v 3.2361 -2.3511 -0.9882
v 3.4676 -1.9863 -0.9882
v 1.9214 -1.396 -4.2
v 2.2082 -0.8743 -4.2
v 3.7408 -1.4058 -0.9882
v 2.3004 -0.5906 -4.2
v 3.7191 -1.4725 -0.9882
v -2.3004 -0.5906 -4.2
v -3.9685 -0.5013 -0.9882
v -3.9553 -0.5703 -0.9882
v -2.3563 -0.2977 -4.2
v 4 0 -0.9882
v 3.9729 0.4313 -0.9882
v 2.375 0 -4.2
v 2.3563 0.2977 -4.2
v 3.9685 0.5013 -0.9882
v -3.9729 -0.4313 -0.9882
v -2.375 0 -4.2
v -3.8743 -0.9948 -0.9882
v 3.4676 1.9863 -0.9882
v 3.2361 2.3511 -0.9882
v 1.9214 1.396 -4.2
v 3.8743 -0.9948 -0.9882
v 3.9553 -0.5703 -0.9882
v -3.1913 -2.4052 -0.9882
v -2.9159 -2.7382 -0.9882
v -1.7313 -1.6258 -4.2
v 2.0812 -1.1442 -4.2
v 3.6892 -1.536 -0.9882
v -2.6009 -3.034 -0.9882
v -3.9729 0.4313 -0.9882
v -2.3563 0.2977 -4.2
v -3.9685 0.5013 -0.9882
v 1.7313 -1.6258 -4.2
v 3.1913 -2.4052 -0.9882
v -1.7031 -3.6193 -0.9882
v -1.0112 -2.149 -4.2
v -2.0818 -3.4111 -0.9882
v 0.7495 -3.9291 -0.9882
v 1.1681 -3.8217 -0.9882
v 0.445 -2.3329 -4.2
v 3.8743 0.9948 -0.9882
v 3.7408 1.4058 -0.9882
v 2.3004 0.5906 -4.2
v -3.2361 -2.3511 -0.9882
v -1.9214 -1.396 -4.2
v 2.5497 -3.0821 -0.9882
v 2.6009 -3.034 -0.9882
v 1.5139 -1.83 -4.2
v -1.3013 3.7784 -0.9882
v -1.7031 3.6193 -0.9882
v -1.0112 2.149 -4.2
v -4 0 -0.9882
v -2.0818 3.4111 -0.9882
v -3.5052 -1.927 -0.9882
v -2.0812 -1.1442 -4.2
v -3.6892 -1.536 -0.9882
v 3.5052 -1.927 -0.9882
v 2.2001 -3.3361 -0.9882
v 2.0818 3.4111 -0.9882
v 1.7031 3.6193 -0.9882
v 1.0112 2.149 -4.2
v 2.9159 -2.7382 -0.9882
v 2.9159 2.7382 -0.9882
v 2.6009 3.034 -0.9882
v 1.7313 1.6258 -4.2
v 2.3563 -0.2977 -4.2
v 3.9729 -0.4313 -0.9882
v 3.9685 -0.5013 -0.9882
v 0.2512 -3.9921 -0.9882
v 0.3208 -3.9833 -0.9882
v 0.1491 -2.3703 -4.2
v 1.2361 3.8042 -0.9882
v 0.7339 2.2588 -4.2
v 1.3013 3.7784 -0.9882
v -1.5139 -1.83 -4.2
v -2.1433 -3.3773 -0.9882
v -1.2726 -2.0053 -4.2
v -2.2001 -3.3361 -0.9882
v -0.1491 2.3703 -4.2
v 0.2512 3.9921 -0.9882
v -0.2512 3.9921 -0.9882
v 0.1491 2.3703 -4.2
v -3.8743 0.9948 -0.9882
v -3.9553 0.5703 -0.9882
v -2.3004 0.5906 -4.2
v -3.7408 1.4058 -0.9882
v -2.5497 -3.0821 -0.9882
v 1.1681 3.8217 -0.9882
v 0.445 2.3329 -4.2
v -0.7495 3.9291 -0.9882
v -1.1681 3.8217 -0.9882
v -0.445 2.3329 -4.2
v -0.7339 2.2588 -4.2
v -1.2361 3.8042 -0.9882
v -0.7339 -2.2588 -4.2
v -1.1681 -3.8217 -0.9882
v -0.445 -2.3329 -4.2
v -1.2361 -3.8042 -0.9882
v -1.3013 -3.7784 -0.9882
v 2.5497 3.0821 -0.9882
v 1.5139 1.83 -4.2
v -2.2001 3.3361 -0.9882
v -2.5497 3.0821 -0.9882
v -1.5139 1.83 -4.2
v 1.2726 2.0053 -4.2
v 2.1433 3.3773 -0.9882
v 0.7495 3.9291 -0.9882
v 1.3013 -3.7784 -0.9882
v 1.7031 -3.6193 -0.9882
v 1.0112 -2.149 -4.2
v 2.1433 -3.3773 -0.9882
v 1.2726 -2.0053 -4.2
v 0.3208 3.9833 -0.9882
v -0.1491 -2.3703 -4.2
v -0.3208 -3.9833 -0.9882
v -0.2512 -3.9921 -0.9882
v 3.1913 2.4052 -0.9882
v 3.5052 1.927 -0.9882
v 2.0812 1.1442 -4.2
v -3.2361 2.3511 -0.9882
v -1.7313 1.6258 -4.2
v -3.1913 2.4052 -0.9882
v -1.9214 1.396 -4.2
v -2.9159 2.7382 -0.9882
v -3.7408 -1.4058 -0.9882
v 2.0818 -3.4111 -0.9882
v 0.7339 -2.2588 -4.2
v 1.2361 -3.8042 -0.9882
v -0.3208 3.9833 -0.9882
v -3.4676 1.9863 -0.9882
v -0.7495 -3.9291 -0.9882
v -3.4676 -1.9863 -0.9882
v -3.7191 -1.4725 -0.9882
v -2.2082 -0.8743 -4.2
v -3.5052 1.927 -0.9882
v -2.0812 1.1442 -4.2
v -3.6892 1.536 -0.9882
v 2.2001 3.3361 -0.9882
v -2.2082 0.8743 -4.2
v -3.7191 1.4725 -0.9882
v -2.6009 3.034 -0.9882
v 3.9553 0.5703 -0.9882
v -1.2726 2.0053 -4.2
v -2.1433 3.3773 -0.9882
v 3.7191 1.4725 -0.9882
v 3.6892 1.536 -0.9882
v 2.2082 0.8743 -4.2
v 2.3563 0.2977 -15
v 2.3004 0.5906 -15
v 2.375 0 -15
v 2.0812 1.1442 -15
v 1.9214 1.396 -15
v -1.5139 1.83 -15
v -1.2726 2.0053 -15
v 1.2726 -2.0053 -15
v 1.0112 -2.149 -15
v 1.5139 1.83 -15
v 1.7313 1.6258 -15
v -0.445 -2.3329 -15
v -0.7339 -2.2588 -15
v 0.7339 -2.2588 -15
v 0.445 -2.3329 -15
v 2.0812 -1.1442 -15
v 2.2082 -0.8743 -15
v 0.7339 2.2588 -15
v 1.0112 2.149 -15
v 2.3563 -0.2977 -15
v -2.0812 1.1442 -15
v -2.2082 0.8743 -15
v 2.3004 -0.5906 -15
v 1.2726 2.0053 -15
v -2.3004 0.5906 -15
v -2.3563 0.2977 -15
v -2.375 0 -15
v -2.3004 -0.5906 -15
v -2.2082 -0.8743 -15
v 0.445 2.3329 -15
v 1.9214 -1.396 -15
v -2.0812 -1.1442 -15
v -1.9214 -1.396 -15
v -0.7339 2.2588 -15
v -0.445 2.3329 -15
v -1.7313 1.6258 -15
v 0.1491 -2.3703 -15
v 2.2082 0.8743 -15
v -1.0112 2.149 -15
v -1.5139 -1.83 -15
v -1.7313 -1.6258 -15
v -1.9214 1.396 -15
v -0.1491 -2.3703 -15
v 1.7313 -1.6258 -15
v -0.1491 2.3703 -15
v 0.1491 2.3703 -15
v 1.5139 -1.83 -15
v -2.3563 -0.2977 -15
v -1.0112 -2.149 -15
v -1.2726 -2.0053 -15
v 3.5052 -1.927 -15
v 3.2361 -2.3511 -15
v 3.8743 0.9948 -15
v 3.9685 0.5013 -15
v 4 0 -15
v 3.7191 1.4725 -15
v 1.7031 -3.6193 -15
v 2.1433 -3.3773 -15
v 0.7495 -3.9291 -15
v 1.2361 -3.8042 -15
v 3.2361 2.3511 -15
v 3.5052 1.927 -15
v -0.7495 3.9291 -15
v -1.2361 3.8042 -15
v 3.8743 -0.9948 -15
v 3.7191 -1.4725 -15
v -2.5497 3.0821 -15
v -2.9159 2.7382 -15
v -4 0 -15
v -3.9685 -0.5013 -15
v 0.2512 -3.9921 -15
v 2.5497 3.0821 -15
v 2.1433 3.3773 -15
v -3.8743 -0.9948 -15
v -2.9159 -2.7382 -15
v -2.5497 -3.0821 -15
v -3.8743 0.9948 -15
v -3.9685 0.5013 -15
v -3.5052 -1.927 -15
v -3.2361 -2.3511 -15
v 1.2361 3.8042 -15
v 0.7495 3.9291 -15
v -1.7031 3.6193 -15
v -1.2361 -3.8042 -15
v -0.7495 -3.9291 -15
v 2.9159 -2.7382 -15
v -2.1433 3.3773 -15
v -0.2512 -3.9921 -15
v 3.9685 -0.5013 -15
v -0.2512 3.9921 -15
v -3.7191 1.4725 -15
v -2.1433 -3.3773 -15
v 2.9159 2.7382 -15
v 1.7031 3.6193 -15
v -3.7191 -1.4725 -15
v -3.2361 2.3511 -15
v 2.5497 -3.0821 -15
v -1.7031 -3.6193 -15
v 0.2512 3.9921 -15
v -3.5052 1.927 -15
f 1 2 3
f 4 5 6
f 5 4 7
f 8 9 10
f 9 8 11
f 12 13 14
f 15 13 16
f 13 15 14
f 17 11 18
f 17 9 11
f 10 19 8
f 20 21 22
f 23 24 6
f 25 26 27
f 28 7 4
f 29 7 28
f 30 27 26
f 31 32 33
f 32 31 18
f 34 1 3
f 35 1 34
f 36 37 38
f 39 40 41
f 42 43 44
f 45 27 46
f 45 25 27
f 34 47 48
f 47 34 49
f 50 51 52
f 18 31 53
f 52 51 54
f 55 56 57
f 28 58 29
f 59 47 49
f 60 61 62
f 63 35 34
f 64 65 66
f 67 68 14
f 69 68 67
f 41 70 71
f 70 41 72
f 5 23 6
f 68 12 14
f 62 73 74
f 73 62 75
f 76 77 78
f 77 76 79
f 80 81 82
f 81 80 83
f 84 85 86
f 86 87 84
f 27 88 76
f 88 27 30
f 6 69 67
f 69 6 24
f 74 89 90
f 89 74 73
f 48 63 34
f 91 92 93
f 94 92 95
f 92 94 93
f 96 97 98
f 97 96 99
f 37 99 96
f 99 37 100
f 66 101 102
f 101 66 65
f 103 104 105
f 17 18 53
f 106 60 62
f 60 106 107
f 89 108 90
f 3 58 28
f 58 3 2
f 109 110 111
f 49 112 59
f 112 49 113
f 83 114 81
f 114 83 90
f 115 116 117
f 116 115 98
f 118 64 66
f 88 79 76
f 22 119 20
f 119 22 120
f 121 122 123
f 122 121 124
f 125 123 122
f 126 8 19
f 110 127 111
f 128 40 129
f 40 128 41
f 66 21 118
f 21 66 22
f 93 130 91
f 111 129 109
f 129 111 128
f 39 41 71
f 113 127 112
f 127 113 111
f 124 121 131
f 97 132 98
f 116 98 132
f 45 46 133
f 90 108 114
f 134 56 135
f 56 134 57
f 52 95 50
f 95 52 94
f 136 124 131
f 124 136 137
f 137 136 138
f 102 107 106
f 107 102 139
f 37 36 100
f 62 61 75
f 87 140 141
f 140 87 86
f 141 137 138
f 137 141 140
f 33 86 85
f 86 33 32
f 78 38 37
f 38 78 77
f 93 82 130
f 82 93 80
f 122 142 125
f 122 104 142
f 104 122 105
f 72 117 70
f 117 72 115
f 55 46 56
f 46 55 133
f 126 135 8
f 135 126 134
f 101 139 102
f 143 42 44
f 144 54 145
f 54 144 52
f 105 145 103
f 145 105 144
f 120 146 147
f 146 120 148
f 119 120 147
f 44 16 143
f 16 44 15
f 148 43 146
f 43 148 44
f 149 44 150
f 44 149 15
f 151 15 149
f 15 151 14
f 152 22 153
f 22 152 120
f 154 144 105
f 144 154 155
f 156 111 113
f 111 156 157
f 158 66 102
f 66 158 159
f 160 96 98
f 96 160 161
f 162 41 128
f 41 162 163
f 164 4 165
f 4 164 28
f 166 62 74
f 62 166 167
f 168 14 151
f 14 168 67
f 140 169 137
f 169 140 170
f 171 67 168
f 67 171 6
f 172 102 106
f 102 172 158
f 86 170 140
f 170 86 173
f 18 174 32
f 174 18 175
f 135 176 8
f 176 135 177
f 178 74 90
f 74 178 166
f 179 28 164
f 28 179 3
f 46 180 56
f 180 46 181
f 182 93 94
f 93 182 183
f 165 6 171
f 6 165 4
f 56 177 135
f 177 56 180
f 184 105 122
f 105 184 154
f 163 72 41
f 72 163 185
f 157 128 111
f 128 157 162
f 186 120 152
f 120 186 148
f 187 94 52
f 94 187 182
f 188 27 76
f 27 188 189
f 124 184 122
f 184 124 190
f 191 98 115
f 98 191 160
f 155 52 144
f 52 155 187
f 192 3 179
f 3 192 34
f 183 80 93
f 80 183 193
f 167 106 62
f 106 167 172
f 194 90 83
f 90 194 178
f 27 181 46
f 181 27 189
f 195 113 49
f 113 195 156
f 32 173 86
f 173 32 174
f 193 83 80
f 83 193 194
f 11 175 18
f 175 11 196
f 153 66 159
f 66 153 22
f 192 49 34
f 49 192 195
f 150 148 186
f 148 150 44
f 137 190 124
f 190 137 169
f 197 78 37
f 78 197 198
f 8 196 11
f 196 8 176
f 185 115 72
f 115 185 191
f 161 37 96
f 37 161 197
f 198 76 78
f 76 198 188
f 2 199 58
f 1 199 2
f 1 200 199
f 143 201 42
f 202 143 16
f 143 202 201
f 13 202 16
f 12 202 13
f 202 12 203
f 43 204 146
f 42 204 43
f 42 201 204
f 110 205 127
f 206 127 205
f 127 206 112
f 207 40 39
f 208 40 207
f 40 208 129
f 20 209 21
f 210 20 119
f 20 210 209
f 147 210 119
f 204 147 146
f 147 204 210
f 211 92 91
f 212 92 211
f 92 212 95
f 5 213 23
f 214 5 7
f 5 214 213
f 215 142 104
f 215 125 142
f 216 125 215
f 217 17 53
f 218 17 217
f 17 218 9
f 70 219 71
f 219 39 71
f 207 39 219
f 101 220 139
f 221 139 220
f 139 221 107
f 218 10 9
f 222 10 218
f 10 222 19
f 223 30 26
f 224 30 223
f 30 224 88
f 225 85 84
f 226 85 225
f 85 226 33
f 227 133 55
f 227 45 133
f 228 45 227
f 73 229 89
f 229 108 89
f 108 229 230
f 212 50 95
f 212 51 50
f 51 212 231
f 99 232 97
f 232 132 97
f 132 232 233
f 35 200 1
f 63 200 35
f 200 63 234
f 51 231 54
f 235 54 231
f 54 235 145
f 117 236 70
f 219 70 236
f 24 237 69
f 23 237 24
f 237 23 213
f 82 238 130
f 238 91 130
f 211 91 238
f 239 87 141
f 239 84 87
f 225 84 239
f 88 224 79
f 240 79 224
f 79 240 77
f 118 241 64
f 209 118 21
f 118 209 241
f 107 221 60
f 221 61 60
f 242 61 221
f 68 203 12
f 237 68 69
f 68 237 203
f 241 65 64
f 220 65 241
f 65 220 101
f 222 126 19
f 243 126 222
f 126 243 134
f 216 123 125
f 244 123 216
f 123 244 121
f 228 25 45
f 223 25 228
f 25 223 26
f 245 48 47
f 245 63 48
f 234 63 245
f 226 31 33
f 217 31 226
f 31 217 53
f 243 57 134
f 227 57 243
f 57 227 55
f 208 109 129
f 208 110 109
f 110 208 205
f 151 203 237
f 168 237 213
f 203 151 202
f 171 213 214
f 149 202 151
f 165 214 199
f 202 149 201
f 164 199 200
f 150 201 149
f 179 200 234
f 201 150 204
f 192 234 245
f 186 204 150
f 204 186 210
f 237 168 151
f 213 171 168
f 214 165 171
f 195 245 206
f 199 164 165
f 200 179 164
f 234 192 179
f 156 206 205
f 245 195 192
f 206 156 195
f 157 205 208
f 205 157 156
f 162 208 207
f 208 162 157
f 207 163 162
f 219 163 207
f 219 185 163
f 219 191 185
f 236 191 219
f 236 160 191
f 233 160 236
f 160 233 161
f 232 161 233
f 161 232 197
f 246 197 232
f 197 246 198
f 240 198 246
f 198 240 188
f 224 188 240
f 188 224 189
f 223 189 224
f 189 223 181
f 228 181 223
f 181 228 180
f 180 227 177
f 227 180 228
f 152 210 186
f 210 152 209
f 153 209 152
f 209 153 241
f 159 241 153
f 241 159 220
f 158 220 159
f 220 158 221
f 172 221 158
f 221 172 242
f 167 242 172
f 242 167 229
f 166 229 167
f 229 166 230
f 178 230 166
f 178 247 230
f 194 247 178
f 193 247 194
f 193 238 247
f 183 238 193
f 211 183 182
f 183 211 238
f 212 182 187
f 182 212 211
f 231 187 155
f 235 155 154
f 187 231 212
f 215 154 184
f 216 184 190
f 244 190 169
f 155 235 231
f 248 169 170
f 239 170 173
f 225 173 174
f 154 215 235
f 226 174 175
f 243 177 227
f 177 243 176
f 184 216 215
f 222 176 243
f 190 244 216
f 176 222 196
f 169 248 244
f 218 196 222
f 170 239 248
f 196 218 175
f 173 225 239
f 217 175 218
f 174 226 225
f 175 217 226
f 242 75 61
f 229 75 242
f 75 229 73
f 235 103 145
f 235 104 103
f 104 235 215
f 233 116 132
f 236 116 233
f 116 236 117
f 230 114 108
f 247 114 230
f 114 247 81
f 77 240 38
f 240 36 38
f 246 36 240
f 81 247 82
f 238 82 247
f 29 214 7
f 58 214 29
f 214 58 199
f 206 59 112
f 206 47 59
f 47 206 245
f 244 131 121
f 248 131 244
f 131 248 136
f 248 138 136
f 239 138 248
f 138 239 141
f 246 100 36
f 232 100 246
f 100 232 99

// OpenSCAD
$fn = 50;

difference() {
	union() {
		translate(v = [0, 0, -15.0]) {
			cylinder(h = 15, r = 4.0);
		}
	}
	union() {
		translate(v = [0, 0, 0]) {
			rotate(a = [0, 0, 0]) {
				difference() {
					union() {
						translate(v = [0, 0, -18.0]) {
							cylinder(h = 18, r = 2.25);
						}
						translate(v = [0, 0, -4.2]) {
							cylinder(h = 4.2, r1 = 2.375, r2 = 4.5);
						}
						translate(v = [0, 0, -18.0]) {
							cylinder(h = 18, r = 2.375);
						}
						translate(v = [0, 0, -18.0]) {
							cylinder(h = 18, r = 2.25);
						}
					}
					union();
				}
			}
		}
	}
}
